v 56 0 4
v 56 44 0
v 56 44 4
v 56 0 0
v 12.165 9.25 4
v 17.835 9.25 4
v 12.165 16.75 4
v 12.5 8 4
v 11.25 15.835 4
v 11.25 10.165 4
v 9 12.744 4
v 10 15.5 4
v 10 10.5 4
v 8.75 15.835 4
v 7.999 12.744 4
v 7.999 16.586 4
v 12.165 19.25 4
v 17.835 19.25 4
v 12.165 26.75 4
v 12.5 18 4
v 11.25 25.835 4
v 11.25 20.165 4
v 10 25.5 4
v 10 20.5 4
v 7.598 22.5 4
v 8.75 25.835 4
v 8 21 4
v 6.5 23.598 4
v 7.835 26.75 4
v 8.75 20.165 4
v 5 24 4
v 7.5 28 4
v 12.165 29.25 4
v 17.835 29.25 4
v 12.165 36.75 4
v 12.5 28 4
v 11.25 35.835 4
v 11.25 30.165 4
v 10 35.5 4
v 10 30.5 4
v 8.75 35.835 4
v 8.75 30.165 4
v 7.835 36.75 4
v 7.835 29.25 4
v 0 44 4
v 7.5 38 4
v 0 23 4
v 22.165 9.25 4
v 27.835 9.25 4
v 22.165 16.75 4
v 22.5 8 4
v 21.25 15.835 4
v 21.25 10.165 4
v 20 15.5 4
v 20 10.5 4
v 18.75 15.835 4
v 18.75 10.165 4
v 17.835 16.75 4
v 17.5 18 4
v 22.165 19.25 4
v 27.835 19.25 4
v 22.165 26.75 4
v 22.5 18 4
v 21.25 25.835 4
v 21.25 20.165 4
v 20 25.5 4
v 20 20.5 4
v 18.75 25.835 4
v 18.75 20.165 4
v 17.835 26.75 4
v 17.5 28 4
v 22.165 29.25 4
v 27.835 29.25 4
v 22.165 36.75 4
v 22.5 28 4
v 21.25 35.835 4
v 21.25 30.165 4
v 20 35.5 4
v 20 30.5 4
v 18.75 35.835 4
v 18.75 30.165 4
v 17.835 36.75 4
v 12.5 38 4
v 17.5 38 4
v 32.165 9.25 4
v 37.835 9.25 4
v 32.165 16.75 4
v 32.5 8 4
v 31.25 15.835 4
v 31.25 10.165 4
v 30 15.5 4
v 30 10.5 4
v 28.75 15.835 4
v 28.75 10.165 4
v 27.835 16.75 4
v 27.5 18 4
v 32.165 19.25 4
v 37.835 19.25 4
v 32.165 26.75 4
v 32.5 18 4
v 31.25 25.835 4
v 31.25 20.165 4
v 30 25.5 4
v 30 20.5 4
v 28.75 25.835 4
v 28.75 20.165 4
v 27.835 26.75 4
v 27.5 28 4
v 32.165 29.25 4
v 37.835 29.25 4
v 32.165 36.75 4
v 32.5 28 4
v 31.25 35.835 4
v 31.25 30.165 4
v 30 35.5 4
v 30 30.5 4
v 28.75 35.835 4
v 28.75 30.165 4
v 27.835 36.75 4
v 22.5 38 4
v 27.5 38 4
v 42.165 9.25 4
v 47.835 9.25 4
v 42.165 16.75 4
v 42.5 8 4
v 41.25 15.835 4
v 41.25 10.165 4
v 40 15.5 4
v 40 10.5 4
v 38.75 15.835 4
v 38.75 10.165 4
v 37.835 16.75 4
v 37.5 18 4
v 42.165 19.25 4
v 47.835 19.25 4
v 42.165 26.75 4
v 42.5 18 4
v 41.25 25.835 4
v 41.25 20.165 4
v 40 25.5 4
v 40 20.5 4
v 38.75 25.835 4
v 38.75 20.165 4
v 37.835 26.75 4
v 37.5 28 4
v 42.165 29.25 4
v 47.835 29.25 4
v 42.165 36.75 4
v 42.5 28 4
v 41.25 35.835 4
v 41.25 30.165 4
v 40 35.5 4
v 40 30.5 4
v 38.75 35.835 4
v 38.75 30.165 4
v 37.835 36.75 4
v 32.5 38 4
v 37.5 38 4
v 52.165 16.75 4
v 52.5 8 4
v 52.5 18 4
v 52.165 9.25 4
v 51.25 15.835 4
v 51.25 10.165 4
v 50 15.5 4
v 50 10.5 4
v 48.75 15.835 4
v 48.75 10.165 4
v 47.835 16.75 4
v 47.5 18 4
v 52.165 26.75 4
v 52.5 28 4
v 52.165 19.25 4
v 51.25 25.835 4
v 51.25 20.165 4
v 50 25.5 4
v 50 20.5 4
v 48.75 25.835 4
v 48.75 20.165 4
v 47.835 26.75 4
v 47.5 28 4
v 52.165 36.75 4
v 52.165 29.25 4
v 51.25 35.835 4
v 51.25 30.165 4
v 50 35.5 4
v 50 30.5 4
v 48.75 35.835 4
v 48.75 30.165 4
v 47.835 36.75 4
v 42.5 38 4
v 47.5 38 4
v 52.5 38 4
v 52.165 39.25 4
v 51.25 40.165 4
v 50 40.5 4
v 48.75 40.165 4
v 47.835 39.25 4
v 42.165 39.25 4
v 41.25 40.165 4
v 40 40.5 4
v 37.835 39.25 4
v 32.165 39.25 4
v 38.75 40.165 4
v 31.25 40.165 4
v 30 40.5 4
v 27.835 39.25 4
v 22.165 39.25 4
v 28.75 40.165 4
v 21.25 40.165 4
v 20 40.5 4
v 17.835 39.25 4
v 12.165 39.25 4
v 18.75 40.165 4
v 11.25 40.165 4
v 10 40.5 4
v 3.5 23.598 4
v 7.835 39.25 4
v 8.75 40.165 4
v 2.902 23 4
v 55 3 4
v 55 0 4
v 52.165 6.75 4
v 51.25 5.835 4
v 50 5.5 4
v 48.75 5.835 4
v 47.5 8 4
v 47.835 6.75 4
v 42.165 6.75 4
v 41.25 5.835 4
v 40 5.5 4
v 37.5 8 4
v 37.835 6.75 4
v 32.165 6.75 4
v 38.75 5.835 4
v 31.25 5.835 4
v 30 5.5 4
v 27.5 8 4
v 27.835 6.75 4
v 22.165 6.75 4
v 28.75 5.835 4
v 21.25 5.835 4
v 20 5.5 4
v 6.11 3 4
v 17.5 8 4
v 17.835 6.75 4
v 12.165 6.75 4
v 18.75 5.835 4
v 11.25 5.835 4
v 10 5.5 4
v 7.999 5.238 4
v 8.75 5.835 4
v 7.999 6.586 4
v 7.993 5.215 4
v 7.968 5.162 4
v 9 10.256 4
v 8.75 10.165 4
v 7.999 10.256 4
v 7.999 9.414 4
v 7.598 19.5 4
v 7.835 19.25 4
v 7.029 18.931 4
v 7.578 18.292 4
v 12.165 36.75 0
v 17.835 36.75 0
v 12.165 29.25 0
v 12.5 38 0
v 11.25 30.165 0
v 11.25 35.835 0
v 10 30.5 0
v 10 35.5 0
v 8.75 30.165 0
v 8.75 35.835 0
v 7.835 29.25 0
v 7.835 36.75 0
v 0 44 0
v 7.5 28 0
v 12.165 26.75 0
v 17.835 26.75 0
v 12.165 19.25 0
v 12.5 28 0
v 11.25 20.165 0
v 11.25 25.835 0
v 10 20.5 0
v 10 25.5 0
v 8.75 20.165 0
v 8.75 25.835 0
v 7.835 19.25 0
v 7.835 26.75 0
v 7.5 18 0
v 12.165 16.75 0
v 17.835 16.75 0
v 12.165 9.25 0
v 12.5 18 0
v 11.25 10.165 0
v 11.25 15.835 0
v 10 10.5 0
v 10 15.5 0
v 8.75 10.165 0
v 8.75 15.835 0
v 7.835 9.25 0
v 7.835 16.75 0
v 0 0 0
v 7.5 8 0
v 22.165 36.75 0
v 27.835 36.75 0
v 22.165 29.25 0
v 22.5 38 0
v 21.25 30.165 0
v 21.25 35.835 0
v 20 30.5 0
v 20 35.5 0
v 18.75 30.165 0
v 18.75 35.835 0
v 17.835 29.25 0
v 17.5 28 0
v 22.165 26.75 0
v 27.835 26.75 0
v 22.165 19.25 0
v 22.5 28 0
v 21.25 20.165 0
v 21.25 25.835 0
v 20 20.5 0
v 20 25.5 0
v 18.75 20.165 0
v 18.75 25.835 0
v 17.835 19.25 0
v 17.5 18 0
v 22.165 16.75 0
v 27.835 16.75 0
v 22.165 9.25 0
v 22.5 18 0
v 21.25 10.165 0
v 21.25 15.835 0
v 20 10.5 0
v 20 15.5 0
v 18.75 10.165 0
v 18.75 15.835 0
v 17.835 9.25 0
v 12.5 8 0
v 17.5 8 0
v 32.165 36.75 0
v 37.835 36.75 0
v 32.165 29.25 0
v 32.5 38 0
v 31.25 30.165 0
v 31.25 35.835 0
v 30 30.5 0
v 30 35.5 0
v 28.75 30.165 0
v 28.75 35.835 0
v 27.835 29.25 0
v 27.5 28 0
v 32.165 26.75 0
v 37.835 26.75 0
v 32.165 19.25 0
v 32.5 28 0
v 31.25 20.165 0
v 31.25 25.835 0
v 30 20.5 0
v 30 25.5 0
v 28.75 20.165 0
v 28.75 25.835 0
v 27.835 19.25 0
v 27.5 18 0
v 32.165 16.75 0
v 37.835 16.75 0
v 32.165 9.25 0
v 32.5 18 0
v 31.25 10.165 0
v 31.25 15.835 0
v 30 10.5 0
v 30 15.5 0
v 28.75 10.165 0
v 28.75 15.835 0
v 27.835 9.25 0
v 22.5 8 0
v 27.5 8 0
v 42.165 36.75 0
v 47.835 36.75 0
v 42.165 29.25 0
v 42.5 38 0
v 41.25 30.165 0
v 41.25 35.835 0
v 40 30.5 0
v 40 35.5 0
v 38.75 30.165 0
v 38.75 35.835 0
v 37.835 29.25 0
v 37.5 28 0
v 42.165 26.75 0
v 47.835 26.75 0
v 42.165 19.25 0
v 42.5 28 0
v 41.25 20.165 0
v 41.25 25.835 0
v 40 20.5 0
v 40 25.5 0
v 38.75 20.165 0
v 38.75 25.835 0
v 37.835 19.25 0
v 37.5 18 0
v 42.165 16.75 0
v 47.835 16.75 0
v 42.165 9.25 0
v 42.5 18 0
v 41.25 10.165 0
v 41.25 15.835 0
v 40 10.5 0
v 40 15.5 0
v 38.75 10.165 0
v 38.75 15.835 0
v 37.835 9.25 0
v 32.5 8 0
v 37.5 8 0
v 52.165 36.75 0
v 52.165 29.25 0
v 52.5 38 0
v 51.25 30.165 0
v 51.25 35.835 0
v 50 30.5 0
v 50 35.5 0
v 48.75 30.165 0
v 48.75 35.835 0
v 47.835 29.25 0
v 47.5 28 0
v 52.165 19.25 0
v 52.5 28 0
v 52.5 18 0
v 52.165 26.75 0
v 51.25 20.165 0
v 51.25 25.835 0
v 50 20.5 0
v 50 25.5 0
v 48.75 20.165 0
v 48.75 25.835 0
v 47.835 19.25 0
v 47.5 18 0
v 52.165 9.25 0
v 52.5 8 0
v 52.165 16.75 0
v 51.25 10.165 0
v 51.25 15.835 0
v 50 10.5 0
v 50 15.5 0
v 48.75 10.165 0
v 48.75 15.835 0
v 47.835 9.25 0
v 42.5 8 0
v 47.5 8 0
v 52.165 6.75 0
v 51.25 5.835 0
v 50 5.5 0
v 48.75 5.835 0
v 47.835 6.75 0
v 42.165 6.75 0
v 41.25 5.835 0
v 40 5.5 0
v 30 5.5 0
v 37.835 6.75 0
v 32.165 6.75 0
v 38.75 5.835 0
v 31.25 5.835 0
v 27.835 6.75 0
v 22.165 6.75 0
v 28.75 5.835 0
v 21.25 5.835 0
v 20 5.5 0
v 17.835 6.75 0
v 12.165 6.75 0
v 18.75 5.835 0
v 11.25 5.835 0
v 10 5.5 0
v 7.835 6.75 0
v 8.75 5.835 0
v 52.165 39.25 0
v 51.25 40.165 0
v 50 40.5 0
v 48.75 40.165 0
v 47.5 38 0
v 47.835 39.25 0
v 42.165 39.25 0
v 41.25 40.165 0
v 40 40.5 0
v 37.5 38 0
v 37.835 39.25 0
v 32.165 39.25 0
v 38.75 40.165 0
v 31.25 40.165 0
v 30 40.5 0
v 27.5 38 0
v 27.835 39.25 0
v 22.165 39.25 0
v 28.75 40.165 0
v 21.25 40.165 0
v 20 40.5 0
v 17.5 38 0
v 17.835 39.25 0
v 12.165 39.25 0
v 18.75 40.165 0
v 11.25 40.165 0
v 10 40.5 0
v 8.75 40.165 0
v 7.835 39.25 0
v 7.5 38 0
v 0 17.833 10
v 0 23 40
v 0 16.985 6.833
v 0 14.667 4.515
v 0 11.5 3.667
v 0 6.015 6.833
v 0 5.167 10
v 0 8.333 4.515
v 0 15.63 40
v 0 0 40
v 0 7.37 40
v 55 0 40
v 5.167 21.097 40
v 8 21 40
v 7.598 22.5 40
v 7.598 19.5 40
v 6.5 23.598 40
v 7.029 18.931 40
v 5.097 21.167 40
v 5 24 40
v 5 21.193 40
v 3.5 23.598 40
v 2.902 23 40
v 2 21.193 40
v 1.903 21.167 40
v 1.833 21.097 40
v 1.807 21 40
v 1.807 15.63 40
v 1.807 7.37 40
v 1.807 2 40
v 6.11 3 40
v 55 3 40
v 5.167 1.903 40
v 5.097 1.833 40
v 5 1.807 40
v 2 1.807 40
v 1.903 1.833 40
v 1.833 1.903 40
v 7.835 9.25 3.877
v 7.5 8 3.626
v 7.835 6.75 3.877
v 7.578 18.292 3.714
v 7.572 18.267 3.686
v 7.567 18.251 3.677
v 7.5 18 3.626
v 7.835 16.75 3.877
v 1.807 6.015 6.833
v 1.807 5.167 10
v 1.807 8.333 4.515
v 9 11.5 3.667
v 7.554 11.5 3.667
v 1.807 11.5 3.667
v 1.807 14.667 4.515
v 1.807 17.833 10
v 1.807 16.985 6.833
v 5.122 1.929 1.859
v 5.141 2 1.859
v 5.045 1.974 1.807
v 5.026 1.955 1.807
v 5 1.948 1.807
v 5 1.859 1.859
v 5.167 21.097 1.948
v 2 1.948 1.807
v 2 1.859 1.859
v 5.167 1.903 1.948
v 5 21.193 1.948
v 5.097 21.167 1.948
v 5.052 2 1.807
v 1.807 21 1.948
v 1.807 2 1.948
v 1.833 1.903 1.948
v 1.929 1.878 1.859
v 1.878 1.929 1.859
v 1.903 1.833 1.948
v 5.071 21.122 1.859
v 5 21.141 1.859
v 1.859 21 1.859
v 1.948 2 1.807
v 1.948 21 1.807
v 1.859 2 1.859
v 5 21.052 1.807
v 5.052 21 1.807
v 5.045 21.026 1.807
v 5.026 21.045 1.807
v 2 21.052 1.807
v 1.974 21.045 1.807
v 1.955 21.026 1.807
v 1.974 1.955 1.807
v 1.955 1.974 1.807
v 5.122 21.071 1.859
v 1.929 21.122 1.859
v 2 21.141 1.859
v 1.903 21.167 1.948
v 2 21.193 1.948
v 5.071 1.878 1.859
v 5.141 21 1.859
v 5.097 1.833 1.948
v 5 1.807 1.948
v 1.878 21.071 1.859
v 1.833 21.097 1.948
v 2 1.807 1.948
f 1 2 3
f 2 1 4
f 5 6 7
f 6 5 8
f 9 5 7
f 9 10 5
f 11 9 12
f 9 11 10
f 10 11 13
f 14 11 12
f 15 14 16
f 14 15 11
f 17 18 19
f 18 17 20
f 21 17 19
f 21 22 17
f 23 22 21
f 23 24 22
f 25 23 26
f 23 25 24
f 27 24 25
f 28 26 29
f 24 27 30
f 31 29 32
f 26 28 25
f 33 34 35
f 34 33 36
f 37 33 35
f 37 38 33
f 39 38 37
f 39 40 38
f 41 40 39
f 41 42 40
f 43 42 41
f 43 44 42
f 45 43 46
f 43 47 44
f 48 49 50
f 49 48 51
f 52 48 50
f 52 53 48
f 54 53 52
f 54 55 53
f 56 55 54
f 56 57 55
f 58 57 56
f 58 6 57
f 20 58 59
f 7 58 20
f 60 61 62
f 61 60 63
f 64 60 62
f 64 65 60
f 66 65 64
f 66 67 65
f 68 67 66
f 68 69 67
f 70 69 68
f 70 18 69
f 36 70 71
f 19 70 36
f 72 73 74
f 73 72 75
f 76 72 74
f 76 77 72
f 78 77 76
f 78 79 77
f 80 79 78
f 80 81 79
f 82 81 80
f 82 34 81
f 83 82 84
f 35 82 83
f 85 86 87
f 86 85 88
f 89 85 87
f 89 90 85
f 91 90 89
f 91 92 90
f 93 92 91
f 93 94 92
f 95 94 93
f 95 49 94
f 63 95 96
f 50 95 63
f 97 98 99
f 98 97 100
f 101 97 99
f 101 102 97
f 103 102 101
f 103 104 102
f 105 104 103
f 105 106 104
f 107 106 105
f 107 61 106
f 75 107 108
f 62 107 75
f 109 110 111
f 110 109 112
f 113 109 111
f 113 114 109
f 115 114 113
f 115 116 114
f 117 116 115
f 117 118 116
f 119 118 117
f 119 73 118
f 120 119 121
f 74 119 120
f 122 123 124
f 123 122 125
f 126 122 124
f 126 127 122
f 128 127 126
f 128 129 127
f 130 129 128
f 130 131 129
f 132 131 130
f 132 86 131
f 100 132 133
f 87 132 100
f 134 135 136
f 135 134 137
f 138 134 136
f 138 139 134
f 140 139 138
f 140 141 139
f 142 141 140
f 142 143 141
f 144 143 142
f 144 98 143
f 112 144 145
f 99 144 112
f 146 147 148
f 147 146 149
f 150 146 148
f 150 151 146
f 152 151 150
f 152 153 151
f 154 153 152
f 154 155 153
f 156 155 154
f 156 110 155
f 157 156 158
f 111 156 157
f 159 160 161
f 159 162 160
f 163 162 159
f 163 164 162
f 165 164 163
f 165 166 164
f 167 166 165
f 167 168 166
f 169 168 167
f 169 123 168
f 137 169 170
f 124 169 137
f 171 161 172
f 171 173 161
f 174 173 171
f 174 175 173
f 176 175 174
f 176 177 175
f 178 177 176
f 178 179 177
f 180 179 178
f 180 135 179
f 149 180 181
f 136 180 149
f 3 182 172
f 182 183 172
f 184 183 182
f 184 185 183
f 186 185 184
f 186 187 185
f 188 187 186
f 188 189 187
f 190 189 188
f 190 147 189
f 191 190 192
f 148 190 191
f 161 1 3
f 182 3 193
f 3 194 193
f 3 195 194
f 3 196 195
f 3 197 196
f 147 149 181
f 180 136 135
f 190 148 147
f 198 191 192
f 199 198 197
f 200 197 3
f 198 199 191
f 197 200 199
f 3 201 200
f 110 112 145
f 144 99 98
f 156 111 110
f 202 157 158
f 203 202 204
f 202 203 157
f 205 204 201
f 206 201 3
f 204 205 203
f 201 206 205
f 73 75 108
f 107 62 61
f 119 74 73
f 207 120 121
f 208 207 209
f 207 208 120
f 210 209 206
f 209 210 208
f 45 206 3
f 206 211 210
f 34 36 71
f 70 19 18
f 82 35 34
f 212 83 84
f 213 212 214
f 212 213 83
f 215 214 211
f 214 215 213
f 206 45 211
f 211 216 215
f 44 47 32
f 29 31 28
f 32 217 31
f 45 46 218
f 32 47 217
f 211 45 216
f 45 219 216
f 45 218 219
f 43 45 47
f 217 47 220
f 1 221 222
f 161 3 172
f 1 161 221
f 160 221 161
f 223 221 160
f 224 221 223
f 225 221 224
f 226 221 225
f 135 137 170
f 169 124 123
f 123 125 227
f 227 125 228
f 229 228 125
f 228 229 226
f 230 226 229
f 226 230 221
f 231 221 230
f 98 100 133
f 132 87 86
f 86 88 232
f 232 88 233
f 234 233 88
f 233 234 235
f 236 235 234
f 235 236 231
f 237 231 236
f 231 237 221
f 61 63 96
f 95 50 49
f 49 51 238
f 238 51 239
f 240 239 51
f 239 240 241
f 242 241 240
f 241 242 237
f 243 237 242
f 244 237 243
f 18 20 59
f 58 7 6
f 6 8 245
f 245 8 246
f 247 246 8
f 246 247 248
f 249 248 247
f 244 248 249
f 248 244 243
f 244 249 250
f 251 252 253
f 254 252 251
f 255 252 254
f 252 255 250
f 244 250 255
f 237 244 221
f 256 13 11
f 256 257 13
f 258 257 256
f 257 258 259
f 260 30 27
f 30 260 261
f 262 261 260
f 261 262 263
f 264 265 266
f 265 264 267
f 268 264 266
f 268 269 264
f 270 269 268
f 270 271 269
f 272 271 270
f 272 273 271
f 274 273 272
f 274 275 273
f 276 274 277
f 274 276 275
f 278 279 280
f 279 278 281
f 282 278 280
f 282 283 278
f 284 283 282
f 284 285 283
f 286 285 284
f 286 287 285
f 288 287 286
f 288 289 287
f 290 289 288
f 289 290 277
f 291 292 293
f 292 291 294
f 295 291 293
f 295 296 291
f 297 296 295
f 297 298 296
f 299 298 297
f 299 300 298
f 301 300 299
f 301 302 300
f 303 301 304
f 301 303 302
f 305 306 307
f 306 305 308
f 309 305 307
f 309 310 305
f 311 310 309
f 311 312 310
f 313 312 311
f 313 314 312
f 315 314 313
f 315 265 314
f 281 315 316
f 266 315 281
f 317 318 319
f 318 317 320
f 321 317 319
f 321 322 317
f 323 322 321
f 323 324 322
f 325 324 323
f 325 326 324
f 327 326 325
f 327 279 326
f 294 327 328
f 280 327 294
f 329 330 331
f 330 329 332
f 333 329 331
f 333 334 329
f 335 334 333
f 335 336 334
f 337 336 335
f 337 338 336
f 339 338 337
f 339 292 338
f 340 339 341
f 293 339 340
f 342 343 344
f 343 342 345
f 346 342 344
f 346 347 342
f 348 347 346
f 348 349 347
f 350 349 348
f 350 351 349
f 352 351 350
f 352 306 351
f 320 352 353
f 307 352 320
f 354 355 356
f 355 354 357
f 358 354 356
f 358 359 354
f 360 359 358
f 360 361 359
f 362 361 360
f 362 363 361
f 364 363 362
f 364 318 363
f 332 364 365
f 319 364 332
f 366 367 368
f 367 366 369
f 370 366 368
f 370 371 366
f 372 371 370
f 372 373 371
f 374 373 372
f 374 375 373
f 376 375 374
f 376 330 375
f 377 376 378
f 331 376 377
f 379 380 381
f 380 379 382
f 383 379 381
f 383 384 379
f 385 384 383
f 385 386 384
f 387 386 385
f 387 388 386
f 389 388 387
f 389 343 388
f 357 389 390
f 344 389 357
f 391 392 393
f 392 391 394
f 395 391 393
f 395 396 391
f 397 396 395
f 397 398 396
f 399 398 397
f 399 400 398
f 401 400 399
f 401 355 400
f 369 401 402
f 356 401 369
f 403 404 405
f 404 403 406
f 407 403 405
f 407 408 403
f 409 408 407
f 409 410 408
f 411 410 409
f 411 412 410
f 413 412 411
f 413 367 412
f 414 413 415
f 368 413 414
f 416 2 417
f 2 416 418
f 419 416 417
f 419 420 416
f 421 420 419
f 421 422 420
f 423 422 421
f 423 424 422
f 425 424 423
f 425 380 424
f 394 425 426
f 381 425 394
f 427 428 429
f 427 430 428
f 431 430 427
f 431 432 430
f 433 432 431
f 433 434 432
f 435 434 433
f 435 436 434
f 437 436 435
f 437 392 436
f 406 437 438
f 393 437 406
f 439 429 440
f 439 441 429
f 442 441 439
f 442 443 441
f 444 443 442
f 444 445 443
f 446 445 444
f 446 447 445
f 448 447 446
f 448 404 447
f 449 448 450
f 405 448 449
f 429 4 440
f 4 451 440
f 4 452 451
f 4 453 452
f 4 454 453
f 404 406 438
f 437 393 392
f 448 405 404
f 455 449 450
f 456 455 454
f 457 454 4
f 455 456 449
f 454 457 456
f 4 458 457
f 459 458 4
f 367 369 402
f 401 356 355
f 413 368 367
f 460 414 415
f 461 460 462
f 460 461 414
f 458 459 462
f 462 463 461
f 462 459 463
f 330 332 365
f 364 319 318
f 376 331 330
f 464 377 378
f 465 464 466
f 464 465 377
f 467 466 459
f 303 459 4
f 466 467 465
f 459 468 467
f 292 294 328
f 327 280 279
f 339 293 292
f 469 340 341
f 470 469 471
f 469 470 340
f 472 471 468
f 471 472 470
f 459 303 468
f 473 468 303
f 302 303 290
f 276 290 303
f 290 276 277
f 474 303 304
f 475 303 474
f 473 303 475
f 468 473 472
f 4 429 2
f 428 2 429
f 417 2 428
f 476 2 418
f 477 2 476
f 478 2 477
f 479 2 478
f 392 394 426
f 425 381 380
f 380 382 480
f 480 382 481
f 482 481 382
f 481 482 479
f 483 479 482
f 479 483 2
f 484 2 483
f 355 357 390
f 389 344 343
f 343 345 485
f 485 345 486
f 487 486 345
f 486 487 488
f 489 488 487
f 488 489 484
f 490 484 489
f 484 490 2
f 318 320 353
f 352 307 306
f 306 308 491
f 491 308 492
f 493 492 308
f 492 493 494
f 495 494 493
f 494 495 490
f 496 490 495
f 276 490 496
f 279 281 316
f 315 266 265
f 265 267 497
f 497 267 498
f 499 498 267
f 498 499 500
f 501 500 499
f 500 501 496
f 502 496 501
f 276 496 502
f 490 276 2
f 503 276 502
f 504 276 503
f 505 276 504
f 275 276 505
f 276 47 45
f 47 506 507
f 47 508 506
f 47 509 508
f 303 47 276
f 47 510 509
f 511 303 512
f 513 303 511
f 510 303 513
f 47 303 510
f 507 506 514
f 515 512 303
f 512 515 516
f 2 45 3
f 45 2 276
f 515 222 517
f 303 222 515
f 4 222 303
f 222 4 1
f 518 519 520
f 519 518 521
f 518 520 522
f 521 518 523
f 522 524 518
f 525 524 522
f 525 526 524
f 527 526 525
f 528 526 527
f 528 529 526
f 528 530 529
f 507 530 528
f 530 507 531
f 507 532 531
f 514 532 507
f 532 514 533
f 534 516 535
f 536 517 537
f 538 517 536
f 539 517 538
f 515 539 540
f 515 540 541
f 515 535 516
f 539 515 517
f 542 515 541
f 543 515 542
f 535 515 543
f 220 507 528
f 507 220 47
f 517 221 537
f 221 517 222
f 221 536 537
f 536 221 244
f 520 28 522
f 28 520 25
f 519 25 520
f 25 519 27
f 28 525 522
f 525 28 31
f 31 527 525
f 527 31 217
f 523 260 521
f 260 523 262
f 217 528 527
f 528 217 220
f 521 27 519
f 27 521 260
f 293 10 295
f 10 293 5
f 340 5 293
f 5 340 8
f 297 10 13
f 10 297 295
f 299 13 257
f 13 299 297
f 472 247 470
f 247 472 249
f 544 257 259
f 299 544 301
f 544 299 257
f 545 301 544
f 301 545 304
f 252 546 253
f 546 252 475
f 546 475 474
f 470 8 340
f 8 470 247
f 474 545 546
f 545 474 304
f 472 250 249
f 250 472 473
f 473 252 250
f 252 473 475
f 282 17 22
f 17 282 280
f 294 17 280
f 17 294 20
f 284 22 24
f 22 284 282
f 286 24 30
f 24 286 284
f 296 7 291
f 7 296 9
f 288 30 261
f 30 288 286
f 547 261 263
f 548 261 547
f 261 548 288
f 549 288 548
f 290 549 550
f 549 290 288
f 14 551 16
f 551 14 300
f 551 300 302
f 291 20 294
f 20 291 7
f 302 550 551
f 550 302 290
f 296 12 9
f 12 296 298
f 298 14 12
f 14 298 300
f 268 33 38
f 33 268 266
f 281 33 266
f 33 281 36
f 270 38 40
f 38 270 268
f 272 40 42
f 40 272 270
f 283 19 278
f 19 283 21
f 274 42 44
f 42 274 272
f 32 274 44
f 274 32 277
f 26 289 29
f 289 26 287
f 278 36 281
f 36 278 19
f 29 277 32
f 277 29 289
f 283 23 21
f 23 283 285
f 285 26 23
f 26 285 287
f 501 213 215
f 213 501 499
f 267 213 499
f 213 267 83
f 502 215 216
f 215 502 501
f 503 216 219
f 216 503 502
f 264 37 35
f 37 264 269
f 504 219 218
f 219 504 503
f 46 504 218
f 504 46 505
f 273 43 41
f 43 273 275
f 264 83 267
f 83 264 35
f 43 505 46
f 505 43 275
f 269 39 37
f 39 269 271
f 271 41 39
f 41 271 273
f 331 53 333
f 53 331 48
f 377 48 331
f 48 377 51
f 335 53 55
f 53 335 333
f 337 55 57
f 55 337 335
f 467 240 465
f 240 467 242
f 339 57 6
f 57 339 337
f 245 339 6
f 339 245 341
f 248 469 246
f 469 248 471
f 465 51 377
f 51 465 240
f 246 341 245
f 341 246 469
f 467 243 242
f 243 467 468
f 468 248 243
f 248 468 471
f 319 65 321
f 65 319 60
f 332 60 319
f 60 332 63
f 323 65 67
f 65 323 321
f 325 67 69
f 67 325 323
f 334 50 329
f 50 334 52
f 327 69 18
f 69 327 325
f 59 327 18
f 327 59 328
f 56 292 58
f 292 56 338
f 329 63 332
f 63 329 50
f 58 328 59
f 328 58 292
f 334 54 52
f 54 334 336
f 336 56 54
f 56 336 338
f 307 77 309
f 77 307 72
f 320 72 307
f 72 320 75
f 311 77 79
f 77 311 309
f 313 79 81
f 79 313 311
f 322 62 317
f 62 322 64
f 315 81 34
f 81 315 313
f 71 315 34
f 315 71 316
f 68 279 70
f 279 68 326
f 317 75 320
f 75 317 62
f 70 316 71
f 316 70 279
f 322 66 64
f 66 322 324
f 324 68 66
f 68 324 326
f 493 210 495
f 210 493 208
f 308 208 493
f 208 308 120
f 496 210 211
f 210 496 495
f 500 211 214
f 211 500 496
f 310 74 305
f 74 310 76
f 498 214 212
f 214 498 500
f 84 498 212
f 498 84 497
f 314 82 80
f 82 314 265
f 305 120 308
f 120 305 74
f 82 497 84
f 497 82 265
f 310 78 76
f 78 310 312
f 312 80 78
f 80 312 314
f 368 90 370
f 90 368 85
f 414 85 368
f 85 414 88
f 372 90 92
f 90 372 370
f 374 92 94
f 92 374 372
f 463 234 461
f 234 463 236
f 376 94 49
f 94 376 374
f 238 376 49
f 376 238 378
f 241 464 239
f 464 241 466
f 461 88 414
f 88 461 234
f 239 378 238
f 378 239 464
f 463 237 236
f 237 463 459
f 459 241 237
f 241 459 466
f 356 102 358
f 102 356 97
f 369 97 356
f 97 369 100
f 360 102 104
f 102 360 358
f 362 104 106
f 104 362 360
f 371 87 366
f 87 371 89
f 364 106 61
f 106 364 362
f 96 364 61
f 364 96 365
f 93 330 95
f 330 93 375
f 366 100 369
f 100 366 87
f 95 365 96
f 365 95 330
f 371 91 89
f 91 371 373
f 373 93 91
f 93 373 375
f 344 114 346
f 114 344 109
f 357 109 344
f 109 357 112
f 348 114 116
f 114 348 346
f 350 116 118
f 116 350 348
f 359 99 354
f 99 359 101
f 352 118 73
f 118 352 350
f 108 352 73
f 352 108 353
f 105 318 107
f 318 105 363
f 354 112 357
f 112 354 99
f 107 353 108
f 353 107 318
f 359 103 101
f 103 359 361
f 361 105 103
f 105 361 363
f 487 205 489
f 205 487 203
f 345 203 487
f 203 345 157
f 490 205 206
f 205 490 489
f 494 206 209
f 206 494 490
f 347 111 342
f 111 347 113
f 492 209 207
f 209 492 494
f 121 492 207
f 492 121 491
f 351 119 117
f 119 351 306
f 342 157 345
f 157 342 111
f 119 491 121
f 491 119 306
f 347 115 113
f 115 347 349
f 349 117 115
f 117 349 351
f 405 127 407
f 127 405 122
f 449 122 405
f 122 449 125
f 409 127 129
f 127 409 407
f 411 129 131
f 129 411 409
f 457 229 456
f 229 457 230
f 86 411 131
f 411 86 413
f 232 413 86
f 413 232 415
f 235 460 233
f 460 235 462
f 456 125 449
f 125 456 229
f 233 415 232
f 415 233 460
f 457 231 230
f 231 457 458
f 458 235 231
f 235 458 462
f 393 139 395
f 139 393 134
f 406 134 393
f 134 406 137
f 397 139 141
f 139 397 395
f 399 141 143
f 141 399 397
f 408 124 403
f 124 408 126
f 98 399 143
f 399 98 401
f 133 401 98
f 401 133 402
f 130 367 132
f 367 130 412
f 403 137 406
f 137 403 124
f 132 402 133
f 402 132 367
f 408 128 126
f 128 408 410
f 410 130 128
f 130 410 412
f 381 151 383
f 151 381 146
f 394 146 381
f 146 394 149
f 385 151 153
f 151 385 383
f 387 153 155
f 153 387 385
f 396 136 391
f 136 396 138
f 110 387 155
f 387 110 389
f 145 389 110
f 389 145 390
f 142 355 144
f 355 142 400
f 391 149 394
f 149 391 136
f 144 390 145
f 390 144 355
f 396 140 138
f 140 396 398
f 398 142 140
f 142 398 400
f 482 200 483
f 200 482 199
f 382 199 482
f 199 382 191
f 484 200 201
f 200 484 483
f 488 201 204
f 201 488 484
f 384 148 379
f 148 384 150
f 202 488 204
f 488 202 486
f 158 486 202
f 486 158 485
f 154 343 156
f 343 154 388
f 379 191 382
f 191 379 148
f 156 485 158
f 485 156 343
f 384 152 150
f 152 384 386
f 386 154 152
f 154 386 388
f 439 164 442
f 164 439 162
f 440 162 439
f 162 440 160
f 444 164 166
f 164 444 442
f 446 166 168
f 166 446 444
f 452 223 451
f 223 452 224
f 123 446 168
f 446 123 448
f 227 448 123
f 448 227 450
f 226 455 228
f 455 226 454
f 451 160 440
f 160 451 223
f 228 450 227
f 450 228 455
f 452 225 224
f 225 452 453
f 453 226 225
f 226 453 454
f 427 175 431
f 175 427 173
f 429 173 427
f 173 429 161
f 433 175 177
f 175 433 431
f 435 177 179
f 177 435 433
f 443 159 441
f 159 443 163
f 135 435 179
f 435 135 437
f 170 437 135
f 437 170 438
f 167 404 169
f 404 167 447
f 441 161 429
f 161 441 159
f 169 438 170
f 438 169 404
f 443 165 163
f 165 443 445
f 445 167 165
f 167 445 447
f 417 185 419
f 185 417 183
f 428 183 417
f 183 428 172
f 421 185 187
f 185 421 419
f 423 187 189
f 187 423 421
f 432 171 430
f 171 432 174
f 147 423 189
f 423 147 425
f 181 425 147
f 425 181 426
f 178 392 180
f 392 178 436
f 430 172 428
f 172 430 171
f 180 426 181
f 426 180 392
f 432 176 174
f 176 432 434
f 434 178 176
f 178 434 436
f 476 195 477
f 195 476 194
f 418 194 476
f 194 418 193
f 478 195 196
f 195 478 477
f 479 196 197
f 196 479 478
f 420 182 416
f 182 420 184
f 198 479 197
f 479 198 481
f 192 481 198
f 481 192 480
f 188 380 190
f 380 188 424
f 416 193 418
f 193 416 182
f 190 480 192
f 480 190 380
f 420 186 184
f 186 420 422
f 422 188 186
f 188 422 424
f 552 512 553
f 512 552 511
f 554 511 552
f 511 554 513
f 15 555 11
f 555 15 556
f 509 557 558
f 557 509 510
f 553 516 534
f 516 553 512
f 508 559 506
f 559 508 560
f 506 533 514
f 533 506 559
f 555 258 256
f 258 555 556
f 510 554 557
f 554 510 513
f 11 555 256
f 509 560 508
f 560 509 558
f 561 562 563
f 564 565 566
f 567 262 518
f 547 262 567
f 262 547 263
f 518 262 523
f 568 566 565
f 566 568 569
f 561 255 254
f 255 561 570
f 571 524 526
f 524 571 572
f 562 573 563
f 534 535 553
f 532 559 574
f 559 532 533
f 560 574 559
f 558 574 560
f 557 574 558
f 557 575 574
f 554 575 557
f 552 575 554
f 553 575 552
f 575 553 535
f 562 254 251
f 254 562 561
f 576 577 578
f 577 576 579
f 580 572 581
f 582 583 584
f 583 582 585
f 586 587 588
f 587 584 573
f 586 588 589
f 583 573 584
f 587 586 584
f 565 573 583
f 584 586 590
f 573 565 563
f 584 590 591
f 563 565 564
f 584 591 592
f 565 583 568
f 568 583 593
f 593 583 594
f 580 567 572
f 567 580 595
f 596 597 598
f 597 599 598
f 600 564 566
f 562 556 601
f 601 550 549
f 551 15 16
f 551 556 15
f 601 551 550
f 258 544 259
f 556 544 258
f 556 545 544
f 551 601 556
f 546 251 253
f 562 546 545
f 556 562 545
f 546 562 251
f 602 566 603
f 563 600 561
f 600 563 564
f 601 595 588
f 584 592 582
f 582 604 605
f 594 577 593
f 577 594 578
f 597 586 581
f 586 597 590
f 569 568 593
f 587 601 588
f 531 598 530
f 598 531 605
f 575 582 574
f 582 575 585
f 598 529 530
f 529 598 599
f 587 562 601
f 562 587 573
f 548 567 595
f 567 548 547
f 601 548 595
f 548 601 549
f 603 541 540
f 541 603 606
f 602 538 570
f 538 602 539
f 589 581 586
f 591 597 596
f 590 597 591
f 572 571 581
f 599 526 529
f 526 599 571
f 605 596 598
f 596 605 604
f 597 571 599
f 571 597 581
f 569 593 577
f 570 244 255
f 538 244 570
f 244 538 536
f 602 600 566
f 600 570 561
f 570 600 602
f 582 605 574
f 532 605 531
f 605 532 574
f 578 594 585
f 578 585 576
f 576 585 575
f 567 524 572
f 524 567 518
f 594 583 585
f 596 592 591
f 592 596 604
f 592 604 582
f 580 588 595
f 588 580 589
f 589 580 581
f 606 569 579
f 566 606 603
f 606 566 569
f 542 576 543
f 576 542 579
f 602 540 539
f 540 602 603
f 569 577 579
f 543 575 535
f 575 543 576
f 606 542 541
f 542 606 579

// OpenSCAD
//clip for
//19mm x 3mm thick handled holder for MCF 'train track' about 40mm long


thick=3;
wide=19;
$fn=12;
clearance=0.2; //this is minkowski around device

difference(){
    
    union(){
translate([0,0,0]) cube([thick+53,wide+25,4]);  //base plate 
translate([0,0,0]) cube([thick+2,wide+4,40]); //main holder
//translate([thick+2,2,0]) cylinder(h=40,d=6,$fn=12); //main rods
translate([thick+2,0,0]) cube([50,3,40]);      //plate to replace one rod, for servo waggling
translate([thick+2,wide+2,0]) cylinder(h=40,d=6,$fn=12); //main rods
    
        }
    
    //subtract core for grabbing flex
hull(){
translate([-1,wide/2+2,40]) rotate([0,90,0]) cylinder(d=wide/2.3,h=10);
translate([-1,wide/2+2,10]) rotate([0,90,0]) cylinder(d=wide/1.5,h=10);    
}
//MCF holder- this is the actual object to be held

hull(){
minkowski(){
translate([2,2,2]) cube([thick,wide,44]);
sphere(r=clearance);
}
translate([wide/3,wide/4+2,5]) cube([thick,wide/2,44]);

}
//translate([1,1,0]) cube([thick,wide+2,14]); //THIS WAS IN BASE OF CLIP 

//hole grid for mounting
for (i = [0:4]) {
    for (j = [0:5]) {
  translate([i*10+10,j*10+8,-1]) cylinder(d=5,h=20);
    }
}

}

module bracket(){
difference(){
union(){
translate([0,0,0]) cube([25,25,4]);  //base plate 
translate([0,0,0]) cube([4,25,20]); //bracket
}
for (i = [0:2]) {
    for (j = [0:3]) {
  translate([i*5+10,j*5+5,-1]) cylinder(d=2.5,h=20);
    }
}
}

}


//translate([30,0,0]) bracket();
